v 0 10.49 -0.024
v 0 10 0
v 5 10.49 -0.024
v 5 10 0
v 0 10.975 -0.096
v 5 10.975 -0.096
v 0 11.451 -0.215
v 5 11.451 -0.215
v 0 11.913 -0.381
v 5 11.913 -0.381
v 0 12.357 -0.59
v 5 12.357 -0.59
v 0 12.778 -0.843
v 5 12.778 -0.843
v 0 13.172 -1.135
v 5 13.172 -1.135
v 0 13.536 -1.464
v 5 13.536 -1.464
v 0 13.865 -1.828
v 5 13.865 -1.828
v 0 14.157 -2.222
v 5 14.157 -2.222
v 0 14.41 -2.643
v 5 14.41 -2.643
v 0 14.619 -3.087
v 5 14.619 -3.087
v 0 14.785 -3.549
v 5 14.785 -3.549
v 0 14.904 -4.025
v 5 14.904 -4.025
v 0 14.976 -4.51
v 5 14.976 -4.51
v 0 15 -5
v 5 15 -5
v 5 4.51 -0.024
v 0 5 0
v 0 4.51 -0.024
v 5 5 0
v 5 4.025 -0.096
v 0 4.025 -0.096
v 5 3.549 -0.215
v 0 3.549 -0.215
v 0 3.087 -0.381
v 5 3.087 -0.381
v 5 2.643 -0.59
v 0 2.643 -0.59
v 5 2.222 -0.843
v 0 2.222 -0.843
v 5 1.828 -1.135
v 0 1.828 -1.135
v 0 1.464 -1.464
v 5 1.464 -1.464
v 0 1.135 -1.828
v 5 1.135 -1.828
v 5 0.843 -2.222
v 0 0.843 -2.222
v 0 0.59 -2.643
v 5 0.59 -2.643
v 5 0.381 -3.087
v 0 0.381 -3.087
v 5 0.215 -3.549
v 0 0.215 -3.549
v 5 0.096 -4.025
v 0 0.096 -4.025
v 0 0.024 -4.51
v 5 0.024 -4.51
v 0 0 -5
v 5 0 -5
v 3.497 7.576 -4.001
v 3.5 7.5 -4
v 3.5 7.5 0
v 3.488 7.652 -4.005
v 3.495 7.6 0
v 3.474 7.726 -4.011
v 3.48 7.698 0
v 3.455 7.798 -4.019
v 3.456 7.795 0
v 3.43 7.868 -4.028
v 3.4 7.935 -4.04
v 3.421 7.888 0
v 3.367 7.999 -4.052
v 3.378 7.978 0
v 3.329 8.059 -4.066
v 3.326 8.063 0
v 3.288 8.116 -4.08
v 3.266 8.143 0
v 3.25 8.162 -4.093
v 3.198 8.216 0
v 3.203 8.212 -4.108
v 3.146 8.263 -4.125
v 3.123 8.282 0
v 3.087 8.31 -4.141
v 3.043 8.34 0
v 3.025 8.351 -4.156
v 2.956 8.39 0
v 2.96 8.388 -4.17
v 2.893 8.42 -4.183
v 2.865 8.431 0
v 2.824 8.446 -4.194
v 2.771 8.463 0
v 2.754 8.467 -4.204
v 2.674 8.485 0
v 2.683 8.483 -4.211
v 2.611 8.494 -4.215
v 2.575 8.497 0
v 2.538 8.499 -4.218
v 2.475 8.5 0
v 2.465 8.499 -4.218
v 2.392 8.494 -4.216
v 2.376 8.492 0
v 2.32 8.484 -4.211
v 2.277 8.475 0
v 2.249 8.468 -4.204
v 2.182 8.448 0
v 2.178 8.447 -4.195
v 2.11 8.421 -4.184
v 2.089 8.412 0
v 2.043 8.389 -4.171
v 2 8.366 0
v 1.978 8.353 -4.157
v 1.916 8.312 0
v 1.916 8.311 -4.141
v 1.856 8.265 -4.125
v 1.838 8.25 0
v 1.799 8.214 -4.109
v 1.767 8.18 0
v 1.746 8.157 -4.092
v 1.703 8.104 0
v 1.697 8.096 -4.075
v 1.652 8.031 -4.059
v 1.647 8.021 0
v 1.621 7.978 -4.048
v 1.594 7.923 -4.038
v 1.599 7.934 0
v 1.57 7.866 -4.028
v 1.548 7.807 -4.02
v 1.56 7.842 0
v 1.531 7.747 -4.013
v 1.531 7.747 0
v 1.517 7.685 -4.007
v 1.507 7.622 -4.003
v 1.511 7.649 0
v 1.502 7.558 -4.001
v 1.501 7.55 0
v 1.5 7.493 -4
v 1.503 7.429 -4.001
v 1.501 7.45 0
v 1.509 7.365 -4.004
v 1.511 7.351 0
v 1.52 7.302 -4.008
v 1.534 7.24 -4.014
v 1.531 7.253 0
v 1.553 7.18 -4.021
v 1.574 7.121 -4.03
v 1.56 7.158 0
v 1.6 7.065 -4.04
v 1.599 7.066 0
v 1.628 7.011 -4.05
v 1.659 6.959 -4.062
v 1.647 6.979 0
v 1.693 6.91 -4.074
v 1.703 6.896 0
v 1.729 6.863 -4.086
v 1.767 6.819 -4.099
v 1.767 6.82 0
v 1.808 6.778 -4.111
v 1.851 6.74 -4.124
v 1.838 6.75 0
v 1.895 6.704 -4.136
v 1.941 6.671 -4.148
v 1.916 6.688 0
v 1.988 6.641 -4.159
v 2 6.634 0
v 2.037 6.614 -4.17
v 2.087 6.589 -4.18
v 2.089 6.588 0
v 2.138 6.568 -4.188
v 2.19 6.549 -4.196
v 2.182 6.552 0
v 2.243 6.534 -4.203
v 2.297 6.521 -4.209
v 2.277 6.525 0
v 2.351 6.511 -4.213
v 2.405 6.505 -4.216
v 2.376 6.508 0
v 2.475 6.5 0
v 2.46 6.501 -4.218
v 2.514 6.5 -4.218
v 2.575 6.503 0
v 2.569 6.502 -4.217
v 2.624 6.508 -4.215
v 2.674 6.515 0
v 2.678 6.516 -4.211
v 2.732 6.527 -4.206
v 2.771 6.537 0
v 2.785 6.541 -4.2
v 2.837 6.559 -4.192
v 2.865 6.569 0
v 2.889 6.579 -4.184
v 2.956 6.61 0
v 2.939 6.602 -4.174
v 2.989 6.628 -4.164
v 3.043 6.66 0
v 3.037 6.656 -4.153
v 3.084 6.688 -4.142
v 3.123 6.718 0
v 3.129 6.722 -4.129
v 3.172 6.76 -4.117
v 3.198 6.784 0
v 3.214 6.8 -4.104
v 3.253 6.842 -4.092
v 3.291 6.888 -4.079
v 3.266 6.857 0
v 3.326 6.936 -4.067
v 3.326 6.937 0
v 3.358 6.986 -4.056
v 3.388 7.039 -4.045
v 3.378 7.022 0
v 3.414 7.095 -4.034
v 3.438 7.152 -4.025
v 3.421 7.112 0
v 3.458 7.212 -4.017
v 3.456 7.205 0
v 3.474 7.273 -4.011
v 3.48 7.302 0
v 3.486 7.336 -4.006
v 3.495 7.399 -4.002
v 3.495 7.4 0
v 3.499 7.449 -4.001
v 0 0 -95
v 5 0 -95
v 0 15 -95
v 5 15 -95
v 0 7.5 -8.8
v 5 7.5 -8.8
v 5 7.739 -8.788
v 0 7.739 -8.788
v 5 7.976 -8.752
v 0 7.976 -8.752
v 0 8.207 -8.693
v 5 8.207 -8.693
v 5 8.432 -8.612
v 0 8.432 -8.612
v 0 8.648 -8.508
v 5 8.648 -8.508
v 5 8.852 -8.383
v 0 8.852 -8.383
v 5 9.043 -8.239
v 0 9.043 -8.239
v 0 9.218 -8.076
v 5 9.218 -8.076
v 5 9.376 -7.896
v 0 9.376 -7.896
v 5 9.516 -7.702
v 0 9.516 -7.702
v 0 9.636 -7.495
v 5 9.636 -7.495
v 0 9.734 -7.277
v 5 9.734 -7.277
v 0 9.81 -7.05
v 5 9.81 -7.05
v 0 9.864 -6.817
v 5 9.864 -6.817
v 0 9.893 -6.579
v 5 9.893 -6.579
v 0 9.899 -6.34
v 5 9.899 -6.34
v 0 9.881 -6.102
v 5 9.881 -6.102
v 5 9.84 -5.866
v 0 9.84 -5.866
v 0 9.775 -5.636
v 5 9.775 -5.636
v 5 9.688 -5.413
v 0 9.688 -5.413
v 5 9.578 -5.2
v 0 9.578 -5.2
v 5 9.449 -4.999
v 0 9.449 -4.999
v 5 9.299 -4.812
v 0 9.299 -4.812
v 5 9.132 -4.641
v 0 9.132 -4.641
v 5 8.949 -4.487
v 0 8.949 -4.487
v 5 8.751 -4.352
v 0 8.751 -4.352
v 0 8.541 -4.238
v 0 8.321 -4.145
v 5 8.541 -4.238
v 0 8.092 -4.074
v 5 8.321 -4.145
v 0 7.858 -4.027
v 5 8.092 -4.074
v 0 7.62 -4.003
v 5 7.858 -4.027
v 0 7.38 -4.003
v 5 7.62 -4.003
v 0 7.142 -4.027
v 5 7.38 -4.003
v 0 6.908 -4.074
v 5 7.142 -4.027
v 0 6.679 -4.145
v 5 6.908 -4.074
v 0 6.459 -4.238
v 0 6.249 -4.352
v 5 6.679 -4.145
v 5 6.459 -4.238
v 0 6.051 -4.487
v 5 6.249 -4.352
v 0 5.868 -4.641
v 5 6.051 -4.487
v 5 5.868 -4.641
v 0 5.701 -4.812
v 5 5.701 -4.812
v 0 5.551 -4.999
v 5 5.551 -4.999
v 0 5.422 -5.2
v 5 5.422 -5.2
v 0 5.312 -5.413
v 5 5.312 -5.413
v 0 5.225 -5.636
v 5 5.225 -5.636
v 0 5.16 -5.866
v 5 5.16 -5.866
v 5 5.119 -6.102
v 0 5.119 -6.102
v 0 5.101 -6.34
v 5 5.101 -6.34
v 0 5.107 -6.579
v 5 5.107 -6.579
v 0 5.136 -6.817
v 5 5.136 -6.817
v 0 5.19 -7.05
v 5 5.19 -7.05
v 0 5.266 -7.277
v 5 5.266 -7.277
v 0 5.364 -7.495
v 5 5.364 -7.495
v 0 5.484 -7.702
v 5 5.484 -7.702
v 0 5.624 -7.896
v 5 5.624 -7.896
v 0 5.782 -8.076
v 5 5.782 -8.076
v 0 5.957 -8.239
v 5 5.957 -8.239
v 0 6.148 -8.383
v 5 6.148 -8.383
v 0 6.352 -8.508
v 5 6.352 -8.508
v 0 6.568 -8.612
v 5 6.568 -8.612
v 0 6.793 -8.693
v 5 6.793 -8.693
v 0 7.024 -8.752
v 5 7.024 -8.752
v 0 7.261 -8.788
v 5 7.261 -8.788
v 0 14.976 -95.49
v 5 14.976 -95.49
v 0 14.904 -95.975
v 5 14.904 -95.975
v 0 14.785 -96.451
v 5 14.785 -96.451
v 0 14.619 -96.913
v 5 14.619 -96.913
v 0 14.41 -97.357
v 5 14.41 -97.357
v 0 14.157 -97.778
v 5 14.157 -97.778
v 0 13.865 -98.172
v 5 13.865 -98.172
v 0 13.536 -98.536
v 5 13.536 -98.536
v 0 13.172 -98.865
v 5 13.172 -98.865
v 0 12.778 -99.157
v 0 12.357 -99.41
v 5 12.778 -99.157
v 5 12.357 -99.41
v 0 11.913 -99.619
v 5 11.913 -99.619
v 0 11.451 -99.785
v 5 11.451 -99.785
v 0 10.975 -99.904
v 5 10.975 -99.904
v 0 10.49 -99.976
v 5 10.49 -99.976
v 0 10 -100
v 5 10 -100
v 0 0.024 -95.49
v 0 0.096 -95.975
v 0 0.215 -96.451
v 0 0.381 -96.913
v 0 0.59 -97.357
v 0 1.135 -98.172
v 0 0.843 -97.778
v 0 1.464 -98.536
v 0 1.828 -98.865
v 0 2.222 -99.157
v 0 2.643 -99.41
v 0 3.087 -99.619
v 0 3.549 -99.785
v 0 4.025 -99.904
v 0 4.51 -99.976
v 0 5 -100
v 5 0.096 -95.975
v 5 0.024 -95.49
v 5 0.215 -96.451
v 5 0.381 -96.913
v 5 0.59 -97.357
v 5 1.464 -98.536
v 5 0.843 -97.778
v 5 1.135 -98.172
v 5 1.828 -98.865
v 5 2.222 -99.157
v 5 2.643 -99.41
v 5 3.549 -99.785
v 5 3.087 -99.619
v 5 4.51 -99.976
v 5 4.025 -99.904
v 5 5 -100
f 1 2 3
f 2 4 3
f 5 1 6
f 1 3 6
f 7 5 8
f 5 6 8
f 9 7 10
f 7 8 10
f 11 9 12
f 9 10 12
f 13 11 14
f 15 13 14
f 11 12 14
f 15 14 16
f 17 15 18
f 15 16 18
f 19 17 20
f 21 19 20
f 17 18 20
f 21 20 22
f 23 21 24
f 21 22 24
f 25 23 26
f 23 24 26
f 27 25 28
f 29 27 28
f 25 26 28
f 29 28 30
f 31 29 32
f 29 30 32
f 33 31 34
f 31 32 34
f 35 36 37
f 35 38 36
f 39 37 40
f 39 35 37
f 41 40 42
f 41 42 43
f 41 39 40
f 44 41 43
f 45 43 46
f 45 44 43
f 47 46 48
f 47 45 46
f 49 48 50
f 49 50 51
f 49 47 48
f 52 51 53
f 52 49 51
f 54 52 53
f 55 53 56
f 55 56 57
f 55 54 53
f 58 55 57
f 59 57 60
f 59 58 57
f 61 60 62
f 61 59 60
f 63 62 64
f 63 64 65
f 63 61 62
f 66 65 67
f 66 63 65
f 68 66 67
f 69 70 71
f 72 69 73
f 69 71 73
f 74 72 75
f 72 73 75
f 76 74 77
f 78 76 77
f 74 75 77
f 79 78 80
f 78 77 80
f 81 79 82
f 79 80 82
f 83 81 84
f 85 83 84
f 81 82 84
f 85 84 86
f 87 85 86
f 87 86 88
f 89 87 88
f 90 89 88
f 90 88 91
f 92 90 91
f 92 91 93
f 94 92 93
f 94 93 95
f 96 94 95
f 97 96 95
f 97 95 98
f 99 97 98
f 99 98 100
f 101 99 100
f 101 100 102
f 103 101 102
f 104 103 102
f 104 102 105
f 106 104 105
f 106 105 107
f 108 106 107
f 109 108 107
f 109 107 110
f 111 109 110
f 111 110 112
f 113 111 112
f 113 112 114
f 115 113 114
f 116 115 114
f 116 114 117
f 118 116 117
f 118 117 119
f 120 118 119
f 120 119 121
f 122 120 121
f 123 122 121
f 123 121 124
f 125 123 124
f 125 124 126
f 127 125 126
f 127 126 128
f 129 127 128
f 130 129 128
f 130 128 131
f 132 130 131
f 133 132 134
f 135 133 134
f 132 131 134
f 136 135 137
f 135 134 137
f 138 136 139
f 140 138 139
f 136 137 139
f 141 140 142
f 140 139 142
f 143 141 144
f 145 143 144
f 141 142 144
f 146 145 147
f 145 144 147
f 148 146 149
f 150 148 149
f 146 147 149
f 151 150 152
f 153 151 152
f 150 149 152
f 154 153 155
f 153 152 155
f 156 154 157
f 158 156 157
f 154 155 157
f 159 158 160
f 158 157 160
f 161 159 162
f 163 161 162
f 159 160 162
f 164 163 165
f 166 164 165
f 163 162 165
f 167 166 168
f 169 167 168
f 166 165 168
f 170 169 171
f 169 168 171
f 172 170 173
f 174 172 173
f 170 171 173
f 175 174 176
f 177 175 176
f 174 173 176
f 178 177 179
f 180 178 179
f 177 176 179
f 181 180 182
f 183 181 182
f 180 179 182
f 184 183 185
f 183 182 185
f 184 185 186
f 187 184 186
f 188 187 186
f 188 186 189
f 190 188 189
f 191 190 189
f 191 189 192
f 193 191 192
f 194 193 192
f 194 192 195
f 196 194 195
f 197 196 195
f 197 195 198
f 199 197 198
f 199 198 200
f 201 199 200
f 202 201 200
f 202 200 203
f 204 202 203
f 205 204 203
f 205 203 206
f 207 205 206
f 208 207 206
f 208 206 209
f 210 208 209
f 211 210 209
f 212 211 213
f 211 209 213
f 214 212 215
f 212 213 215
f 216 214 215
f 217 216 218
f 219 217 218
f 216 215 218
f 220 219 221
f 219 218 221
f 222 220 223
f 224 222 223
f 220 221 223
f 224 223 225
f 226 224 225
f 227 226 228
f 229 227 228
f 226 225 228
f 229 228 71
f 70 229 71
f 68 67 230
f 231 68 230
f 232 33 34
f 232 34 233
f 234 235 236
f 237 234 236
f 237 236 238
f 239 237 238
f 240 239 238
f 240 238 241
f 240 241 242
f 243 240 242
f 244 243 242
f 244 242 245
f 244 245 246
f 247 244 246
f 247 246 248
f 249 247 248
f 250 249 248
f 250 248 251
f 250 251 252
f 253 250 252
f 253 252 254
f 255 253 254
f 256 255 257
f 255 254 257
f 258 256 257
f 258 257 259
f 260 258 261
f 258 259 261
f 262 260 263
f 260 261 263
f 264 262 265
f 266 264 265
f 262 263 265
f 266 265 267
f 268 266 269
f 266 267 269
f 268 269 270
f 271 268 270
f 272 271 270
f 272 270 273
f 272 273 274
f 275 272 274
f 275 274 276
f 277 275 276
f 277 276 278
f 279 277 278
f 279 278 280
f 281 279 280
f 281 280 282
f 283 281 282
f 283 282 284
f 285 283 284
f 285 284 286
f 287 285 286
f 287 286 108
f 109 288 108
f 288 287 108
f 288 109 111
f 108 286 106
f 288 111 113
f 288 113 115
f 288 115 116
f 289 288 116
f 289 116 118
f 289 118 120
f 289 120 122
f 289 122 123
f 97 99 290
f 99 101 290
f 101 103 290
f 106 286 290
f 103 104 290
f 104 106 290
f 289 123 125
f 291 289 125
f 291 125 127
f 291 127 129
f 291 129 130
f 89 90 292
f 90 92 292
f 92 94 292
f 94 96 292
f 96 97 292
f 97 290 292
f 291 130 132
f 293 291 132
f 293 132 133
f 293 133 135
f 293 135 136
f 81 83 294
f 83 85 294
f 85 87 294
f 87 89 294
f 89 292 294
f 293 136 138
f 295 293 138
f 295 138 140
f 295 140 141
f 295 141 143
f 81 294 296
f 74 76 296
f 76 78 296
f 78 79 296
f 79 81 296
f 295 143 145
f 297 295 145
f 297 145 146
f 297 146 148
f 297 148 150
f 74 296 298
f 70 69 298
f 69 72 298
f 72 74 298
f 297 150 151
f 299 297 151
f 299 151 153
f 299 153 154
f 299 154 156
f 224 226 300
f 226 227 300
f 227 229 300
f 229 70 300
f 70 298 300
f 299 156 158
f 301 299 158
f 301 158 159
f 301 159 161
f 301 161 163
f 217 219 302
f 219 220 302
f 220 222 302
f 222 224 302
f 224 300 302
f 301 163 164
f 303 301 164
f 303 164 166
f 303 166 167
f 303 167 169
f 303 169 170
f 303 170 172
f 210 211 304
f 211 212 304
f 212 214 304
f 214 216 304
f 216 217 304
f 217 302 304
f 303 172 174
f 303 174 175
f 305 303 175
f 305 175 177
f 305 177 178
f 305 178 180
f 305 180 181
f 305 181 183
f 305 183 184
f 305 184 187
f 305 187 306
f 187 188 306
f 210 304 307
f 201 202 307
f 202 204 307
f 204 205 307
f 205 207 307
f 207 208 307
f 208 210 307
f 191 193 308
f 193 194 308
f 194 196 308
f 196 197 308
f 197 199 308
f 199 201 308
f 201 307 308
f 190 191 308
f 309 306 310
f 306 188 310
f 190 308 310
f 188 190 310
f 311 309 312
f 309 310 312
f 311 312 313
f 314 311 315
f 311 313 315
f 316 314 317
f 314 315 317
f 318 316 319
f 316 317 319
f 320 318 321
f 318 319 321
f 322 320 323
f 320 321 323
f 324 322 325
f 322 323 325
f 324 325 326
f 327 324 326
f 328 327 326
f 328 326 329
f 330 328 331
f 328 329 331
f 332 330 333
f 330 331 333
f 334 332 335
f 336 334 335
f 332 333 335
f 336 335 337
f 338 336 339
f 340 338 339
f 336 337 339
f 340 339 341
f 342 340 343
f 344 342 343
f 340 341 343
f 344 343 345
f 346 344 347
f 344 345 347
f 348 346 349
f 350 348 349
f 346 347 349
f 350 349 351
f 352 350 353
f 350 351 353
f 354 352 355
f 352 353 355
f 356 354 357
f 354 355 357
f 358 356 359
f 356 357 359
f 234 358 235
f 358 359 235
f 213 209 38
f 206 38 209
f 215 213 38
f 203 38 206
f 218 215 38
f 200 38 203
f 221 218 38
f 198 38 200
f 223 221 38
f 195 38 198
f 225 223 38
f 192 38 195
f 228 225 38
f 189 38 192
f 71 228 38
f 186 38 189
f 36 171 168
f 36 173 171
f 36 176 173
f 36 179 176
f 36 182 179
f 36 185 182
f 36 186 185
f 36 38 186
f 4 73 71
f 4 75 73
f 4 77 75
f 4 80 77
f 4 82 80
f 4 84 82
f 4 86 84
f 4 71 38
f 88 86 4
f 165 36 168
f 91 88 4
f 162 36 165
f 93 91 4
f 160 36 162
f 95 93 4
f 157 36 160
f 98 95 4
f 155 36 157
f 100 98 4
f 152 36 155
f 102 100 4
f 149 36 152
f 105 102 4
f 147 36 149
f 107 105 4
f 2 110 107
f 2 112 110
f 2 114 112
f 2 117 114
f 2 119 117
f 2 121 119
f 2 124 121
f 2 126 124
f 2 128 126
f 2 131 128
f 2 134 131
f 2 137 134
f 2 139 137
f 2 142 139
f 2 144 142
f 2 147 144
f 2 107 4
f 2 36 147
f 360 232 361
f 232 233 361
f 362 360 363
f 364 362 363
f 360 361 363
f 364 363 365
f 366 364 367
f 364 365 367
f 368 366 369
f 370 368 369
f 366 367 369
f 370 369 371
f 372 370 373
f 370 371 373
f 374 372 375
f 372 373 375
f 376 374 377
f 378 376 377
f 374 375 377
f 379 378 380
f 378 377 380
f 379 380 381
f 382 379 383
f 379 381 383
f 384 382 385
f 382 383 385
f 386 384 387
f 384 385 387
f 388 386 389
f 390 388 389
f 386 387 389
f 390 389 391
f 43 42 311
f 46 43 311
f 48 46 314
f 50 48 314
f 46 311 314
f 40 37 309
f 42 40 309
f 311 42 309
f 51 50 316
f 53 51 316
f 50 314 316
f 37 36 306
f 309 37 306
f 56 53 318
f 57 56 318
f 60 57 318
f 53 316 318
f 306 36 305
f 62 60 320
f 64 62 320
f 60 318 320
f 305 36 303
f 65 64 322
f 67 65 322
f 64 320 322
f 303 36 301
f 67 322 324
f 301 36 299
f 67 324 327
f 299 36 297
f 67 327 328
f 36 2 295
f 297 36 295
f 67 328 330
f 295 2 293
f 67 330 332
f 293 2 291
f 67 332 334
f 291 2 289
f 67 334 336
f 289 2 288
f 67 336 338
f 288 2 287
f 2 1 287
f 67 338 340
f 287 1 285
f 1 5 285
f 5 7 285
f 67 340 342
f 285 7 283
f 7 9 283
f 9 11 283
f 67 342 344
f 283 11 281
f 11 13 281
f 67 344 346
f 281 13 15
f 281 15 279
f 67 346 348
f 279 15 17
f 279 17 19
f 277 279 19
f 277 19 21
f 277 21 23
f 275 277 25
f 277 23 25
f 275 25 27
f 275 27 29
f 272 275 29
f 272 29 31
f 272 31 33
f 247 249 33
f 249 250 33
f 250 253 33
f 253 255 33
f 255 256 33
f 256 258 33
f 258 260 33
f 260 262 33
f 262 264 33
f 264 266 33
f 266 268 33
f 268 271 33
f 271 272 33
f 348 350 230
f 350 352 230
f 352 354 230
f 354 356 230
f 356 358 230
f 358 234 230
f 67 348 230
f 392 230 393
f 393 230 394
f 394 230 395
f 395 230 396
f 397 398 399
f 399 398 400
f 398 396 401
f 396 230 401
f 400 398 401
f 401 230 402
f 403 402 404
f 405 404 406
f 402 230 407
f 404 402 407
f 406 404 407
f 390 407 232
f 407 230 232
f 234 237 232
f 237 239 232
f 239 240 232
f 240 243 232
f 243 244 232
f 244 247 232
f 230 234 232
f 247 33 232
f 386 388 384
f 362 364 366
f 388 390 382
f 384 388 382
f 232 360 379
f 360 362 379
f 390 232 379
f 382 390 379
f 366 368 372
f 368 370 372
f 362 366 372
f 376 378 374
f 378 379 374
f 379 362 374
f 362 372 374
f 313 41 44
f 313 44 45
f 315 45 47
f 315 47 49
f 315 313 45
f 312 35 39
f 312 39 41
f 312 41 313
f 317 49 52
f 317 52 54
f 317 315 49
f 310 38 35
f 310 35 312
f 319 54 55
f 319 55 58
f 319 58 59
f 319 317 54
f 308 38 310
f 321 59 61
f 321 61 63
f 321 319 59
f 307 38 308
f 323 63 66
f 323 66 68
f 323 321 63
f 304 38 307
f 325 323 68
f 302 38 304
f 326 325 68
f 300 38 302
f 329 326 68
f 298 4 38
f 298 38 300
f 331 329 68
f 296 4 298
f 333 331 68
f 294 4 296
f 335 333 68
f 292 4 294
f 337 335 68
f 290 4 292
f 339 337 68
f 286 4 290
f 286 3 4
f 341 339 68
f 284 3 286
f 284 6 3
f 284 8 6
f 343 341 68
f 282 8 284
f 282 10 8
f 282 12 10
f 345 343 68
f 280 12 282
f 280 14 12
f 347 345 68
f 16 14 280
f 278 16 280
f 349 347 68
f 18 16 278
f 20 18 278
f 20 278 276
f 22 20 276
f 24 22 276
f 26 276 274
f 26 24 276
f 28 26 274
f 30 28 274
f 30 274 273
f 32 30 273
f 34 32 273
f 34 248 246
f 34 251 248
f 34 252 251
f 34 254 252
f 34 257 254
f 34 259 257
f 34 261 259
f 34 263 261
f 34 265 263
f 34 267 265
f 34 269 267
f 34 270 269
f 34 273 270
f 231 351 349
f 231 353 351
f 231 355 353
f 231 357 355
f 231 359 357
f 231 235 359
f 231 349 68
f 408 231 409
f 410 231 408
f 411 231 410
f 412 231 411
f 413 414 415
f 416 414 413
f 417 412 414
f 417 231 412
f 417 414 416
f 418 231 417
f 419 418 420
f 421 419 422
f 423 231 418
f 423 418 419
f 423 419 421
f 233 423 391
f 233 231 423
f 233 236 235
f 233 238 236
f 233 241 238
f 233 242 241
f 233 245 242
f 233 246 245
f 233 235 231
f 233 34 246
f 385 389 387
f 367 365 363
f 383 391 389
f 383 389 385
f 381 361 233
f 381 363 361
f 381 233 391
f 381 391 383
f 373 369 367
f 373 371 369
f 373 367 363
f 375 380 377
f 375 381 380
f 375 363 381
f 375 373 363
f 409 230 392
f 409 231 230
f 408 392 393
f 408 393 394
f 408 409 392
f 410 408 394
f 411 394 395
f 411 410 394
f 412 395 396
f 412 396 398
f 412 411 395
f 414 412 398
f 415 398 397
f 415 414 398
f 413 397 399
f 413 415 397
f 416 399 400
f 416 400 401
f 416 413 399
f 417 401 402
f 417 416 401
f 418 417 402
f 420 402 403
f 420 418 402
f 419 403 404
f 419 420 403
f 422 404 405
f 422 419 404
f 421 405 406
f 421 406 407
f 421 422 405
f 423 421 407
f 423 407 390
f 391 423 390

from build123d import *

# Parameters (mm, degrees)
SKETCH_1_W          = 100
SKETCH_1_H          = 15
EXTRUDE_1_DEPTH     = 5
SKETCH_2_R          = 2.4
CUT_EXTRUDE_1_DEPTH = 5
FILLET_1_R          = 5
SKETCH_4_R          = 1
CUT_EXTRUDE_2_DEPTH = 7


with BuildPart() as part:
    # 草图1 → 凸台-拉伸1 (new body)
    with BuildSketch(Plane(origin=(0, 0, 0), x_dir=(0, 0, -1), z_dir=(1, 0, 0))):
        with Locations((50, 7.5)):
            Rectangle(SKETCH_1_W, SKETCH_1_H)
    extrude(amount=EXTRUDE_1_DEPTH)

    # 草图2 → 切除-拉伸1 (cut)
    with BuildSketch(Plane(origin=(5, 0, 0), x_dir=(0, 0, -1), z_dir=(1, 0, 0))):
        with Locations((6.4, 7.5)):
            Circle(SKETCH_2_R)
    extrude(amount=-CUT_EXTRUDE_1_DEPTH, mode=Mode.SUBTRACT)

    # 圆角1
    fillet_1_edges = [part.edges().sort_by_distance(p)[0] for p in [
        (2.5, 15, 0),
        (2.5, 15, -100),
        (2.5, 0, -100),
        (2.5, 0, 0),
    ]]
    fillet(fillet_1_edges, radius=FILLET_1_R)

    # 草图4 → 切除-拉伸2 (cut)
    with BuildSketch(Plane.XY):
        with Locations((2.5, 7.5)):
            Circle(SKETCH_4_R)
    extrude(amount=-CUT_EXTRUDE_2_DEPTH, mode=Mode.SUBTRACT)


solid = part.part
